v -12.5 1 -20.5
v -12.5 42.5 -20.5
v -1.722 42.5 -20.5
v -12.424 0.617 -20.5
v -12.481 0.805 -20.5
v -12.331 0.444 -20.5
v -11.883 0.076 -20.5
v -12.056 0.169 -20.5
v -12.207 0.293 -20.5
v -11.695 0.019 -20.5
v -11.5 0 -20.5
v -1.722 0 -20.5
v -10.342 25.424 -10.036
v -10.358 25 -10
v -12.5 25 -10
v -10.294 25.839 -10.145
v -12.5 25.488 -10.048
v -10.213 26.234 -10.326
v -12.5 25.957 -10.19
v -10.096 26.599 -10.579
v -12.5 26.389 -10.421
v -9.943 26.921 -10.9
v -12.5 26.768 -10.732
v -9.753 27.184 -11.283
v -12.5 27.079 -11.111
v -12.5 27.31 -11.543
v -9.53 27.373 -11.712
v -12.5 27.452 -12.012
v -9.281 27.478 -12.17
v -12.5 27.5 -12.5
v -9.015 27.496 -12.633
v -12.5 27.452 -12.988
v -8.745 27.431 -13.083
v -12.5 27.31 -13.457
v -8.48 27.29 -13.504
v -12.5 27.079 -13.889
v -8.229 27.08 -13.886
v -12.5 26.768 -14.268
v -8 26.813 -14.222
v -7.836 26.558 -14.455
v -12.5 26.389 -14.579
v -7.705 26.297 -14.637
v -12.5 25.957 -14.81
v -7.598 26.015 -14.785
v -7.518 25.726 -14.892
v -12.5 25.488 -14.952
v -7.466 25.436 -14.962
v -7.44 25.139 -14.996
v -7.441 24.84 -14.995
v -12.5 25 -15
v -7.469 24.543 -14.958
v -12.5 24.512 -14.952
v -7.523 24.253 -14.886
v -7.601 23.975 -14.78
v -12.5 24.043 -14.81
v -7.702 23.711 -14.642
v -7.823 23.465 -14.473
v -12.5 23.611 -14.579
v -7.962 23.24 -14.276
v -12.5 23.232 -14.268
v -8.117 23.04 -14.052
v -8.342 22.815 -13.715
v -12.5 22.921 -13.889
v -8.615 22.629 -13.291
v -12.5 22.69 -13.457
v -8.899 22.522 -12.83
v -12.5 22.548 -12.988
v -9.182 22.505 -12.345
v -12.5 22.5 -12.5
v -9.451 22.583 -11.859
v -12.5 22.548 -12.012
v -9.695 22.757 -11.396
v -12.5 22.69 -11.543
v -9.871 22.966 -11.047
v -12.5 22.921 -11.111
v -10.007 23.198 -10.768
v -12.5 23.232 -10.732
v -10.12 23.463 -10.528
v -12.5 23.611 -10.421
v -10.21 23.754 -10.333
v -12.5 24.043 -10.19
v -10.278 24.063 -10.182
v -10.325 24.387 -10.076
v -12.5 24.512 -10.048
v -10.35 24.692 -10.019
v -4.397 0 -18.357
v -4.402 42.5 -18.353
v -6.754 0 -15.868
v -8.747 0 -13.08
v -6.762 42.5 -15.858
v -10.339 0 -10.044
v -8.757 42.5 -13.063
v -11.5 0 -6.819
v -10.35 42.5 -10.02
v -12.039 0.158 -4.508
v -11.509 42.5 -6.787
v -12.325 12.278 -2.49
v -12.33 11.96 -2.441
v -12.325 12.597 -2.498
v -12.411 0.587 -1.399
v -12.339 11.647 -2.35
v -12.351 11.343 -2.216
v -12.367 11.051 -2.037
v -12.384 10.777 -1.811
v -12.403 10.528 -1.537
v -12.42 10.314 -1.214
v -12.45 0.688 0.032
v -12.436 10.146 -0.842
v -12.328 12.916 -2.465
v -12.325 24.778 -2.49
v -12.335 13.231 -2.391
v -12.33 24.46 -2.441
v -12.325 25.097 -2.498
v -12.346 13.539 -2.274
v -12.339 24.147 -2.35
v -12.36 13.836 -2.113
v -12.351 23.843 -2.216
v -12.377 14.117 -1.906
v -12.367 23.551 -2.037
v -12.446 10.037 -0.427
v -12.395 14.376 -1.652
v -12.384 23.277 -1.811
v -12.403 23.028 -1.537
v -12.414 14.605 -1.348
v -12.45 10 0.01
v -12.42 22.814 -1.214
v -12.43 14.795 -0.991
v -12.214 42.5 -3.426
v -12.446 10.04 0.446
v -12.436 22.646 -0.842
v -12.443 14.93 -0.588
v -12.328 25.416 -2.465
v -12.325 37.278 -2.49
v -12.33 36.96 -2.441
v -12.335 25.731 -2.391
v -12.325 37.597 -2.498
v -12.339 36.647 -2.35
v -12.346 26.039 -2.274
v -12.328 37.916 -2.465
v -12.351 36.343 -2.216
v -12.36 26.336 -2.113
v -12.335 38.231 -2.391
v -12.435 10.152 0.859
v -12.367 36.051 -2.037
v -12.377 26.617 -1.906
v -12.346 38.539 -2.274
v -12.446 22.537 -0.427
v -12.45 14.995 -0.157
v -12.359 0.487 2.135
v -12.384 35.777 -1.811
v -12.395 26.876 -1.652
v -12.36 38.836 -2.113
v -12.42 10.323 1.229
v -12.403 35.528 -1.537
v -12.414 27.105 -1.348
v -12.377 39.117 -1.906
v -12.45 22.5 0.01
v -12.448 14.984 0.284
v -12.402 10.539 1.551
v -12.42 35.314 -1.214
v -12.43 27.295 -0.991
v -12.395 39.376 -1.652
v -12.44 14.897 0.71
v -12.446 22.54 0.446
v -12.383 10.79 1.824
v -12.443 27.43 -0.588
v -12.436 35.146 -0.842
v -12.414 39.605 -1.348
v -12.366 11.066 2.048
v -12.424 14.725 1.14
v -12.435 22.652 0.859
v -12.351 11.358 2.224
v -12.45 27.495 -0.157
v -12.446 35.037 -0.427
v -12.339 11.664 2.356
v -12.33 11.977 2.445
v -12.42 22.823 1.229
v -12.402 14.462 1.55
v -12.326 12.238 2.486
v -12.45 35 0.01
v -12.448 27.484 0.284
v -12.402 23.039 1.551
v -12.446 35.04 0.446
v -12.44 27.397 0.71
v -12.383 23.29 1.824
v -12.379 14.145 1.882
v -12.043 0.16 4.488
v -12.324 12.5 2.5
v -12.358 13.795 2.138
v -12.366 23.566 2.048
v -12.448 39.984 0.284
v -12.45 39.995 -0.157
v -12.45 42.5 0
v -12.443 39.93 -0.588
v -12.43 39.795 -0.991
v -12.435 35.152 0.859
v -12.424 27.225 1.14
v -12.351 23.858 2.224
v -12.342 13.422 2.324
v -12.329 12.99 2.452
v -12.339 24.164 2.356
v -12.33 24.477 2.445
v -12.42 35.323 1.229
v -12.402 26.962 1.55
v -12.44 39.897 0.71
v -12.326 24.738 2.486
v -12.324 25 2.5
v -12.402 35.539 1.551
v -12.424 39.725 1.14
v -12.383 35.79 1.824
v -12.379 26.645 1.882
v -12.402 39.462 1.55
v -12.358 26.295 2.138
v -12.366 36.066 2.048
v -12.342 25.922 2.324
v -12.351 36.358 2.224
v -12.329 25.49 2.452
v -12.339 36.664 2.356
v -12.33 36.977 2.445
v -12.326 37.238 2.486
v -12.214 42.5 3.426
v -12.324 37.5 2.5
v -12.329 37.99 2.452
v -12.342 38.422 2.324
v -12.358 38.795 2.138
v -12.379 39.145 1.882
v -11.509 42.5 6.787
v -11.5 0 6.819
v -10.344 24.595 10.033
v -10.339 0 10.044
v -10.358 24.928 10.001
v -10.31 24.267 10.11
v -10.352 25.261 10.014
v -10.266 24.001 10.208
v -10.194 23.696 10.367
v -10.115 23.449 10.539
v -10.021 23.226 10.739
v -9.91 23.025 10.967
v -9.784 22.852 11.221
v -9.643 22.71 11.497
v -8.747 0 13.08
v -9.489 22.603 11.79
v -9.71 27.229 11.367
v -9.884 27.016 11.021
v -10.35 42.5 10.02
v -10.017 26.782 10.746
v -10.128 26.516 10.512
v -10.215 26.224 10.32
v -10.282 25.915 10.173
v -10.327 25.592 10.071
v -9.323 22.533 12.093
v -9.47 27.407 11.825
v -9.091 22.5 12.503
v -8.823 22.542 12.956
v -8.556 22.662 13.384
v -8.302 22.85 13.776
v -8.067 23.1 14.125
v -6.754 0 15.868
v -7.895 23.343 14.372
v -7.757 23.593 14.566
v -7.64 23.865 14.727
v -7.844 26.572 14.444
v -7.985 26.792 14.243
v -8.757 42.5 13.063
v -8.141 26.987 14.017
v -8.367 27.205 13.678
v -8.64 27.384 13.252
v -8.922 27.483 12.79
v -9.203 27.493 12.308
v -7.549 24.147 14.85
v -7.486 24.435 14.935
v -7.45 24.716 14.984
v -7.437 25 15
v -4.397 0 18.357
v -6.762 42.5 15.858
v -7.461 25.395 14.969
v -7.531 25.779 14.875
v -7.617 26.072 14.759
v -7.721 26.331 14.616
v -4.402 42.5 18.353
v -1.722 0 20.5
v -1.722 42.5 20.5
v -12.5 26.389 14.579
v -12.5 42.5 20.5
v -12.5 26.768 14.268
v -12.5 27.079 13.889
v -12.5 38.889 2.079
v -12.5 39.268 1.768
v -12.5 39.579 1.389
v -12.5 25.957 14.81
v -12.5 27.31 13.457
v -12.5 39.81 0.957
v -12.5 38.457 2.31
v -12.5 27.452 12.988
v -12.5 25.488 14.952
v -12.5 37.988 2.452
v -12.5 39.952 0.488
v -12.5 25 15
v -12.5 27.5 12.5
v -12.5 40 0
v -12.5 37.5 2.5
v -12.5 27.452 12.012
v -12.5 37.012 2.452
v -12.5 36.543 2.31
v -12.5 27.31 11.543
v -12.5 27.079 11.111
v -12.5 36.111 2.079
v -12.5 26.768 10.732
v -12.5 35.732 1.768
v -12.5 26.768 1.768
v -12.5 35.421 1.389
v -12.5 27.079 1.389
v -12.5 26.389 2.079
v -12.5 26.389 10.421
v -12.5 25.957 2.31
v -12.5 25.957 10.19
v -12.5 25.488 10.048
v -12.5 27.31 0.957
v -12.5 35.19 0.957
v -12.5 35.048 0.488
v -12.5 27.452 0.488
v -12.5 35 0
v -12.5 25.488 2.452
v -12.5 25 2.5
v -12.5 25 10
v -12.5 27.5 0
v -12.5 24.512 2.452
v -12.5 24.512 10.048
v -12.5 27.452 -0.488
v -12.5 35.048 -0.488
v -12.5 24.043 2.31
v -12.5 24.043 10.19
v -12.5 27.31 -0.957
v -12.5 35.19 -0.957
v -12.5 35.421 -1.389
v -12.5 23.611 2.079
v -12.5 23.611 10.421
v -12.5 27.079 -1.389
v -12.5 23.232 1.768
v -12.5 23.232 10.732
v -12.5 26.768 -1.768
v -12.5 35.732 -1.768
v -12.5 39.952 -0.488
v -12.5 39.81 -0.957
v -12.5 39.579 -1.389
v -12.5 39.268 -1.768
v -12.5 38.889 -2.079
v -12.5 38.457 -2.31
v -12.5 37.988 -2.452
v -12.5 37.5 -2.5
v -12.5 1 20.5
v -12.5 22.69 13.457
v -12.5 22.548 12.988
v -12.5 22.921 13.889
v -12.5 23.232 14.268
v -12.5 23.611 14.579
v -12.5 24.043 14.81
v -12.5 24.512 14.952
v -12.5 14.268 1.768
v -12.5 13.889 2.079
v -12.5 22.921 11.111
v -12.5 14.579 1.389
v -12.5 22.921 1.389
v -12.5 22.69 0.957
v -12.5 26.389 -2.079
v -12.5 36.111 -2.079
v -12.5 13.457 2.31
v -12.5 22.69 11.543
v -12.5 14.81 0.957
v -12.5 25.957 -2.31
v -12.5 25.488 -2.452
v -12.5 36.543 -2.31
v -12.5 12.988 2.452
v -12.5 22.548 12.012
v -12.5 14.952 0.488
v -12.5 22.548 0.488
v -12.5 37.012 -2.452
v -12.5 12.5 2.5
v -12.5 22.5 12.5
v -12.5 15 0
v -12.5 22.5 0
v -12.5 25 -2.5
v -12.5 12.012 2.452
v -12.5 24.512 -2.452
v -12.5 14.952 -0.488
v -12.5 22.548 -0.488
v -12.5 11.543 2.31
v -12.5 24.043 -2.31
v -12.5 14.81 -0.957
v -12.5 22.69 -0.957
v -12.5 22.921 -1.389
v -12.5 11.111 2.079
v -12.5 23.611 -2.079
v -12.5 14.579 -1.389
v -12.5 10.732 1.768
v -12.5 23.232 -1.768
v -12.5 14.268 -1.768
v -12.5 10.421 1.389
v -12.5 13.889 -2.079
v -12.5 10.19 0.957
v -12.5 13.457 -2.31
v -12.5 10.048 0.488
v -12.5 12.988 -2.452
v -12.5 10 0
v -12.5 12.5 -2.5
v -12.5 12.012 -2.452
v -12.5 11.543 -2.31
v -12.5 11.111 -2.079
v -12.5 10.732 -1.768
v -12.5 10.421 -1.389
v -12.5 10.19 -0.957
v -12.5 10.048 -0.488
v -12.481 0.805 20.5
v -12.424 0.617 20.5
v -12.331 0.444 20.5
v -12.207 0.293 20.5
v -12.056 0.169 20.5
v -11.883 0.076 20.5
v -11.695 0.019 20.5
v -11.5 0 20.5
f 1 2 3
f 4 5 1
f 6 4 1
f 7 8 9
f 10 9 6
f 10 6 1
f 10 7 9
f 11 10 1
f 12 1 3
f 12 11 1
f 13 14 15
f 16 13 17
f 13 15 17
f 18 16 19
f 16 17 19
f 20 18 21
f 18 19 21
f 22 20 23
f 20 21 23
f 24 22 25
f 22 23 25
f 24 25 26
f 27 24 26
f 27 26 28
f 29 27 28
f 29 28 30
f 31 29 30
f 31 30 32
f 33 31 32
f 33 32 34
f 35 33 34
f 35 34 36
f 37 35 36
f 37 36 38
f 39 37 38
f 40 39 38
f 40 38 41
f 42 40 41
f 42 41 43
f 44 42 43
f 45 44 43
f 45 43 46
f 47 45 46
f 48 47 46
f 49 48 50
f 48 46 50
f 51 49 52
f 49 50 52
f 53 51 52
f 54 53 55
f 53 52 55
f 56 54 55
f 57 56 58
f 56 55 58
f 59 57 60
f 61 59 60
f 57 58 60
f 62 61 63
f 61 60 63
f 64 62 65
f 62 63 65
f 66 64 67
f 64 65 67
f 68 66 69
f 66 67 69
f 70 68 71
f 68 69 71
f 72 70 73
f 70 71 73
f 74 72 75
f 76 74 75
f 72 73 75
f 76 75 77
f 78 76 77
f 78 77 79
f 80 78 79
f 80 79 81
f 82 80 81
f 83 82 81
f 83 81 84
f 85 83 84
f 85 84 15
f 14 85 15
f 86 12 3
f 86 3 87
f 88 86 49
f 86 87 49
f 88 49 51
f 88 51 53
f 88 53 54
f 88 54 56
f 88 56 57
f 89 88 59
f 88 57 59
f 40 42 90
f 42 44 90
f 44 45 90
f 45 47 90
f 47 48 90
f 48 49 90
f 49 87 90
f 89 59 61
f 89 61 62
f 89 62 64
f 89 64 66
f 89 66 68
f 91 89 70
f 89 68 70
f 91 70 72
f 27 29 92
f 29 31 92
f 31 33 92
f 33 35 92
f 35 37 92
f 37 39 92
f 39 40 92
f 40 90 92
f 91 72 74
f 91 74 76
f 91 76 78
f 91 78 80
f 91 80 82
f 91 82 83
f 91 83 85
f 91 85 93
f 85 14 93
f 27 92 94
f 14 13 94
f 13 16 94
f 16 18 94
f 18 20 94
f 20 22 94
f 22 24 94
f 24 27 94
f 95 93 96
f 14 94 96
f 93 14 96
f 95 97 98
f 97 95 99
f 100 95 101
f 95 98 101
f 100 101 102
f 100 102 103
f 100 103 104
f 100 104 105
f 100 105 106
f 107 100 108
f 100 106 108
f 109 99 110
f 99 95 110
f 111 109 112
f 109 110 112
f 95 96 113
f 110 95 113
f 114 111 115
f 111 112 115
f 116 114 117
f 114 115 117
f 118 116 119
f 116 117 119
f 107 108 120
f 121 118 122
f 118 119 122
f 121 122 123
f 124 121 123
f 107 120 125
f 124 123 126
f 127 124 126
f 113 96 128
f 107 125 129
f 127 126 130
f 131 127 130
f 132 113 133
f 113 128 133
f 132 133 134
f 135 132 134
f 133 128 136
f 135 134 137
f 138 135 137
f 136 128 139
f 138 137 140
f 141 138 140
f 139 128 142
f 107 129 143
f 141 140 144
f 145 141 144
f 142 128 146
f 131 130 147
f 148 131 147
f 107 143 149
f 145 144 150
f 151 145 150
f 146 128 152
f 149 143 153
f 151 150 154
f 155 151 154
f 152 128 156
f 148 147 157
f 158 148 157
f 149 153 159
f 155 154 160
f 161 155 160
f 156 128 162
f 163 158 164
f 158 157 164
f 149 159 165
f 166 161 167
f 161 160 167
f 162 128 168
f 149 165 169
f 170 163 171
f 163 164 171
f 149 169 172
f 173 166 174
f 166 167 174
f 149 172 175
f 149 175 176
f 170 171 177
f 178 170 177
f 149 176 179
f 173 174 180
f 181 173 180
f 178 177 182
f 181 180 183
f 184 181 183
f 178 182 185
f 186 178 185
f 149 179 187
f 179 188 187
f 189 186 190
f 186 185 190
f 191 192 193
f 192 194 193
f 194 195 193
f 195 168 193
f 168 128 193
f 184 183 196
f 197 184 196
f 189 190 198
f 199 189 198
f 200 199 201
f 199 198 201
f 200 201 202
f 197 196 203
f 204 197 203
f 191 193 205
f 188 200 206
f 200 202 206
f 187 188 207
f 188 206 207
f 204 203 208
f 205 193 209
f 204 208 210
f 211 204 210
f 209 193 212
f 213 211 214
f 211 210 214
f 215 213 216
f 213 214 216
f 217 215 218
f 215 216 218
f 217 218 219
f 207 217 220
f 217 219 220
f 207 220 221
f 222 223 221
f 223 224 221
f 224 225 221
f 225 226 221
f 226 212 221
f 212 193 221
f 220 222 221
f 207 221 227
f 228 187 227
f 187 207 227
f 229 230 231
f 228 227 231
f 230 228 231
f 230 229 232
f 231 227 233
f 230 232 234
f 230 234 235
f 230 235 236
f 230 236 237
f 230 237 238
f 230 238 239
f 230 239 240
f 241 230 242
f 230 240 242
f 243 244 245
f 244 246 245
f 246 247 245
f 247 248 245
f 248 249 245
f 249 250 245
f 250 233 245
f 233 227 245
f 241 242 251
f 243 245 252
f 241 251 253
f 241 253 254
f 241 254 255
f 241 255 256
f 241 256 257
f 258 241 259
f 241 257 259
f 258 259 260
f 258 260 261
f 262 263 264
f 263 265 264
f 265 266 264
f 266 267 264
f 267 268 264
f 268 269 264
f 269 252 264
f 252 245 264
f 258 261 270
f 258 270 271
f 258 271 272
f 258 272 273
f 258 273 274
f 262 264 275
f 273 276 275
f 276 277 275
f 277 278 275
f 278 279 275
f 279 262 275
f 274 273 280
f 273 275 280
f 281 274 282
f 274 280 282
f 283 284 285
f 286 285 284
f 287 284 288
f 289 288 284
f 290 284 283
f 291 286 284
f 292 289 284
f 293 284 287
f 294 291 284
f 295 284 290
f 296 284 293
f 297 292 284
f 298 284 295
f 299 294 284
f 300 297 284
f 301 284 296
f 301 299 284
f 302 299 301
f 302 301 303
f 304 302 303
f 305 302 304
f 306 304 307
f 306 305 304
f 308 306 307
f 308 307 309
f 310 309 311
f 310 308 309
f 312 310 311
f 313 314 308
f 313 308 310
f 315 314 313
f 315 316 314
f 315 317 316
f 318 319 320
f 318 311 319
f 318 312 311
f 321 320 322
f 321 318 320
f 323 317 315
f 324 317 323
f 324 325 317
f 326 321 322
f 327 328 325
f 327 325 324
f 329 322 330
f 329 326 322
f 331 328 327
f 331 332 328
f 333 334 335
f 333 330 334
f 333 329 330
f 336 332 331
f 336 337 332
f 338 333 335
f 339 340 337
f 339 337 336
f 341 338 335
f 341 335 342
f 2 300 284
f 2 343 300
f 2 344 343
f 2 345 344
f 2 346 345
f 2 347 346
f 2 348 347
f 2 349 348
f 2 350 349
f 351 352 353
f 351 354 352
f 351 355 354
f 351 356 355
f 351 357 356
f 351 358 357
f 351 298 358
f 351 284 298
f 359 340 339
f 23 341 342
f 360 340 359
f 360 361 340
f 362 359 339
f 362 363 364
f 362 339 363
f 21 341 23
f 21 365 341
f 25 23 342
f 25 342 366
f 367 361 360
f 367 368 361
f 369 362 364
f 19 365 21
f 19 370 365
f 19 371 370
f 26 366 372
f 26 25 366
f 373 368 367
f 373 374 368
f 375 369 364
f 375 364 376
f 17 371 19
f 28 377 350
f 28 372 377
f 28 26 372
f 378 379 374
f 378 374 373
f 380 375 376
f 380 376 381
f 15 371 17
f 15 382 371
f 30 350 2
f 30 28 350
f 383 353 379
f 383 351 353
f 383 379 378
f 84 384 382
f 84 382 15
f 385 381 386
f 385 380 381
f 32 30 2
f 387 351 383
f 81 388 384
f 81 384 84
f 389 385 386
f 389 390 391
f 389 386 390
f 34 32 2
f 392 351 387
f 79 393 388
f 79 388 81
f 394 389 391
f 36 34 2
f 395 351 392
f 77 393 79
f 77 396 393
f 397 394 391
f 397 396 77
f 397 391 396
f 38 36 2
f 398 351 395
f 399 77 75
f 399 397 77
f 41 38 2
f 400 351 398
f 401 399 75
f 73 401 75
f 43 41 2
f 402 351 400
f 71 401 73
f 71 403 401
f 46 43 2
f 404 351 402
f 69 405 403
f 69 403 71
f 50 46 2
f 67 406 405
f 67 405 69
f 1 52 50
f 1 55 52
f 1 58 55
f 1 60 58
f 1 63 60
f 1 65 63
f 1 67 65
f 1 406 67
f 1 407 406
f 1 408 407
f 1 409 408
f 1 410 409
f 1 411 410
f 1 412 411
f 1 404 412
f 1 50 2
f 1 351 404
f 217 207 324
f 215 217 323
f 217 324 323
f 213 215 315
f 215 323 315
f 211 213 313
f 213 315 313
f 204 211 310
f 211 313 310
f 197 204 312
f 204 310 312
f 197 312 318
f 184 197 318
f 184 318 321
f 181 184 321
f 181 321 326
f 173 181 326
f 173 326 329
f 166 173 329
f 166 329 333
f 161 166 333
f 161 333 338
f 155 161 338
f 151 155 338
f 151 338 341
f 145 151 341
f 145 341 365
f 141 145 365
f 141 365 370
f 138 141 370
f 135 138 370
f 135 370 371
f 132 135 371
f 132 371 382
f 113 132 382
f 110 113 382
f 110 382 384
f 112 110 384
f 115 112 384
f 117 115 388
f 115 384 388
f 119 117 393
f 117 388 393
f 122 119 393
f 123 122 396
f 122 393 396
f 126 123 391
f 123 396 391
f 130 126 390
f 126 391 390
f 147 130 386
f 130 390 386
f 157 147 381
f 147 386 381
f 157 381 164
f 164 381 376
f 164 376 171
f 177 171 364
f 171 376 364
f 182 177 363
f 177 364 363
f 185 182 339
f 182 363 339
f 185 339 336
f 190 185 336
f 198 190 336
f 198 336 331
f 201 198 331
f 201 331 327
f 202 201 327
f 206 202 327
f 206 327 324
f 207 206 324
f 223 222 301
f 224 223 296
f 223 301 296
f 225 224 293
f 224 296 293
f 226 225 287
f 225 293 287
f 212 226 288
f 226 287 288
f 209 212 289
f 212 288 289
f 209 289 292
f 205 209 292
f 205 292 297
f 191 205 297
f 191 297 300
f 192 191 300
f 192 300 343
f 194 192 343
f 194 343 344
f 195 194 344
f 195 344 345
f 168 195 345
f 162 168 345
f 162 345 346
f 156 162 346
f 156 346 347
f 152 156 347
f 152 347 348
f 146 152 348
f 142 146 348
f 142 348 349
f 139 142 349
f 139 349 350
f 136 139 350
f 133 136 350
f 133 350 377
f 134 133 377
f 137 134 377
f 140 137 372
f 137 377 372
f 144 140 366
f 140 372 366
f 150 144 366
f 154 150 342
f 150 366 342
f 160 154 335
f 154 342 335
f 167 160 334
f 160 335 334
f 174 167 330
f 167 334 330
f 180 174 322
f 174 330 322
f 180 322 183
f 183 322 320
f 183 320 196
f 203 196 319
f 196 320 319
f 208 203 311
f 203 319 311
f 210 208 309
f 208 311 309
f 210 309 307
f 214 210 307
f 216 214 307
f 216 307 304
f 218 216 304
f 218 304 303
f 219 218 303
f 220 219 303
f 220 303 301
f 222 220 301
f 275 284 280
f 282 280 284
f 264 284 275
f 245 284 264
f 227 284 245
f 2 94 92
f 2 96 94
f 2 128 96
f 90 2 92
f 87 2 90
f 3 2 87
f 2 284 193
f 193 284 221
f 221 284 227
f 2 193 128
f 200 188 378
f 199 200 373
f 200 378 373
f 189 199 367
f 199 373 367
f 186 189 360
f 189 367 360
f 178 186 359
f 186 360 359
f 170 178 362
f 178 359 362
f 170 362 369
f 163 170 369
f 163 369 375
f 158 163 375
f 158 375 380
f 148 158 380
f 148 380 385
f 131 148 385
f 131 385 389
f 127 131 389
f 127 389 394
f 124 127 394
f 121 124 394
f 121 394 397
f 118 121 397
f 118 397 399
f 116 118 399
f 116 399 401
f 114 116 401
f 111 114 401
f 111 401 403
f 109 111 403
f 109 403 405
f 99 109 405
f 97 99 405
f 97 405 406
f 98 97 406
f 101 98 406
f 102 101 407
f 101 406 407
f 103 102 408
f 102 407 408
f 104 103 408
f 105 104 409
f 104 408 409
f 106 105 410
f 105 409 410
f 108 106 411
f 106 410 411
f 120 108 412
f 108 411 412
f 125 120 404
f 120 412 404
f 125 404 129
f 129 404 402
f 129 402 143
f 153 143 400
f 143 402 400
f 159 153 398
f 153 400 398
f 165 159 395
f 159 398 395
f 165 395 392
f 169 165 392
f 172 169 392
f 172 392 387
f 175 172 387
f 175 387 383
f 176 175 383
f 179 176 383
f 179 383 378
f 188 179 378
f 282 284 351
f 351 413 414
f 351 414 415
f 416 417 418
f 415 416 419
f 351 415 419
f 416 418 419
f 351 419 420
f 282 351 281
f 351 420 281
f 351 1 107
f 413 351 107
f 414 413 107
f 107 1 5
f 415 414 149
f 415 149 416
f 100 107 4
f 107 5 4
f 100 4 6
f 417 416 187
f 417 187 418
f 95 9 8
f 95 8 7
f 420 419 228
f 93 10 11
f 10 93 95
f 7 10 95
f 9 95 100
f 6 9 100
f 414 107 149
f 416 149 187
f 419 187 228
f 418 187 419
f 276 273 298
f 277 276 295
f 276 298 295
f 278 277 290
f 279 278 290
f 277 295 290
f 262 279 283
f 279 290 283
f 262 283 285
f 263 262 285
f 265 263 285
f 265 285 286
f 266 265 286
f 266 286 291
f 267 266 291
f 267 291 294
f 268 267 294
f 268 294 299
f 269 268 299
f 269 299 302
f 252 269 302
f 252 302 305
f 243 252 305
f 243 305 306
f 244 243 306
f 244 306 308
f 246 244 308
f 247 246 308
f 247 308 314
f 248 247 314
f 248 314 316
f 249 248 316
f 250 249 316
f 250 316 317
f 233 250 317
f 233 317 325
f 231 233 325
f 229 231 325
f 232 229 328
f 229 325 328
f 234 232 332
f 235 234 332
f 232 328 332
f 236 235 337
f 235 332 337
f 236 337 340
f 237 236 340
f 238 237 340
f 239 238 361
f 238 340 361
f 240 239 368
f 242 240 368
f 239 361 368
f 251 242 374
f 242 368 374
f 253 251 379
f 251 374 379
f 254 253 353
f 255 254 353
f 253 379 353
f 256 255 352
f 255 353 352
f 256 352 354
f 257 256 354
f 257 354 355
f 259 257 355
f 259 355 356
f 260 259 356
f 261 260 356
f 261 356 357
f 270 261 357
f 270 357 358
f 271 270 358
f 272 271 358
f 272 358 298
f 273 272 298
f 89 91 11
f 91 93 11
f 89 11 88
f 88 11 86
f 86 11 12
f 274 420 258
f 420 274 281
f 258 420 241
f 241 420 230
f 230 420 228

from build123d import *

# Parameters (mm, degrees)
SKETCH_1_W          = 25
SKETCH_1_H          = 41
EXTRUDE_1_DEPTH     = 42.5
FILLET_1_R          = 1
SKETCH_2_R          = 24.95
CUT_EXTRUDE_1_DEPTH = 42.5
SKETCH_3_R          = 2.5
CUT_EXTRUDE_2_DEPTH = 10


with BuildPart() as part:
    # Эскиз1 → Бобышка-Вытянуть1 (new body)
    with BuildSketch(Plane(origin=(0, 0, 0), x_dir=(1, 0, 0), z_dir=(0, 1, 0))):
        Rectangle(SKETCH_1_W, SKETCH_1_H)
    extrude(amount=EXTRUDE_1_DEPTH)

    # Скругление1
    fillet_1_edges = [part.edges().sort_by_distance(p)[0] for p in [
        (-12.5, 0, 0),
    ]]
    fillet(fillet_1_edges, radius=FILLET_1_R)

    # Эскиз2 → Вырез-Вытянуть1 (cut)
    with BuildSketch(Plane(origin=(0, 42.5, 0), x_dir=(1, 0, 0), z_dir=(0, 1, 0))):
        with Locations((12.5, 0)):
            Circle(SKETCH_2_R)
    extrude(amount=-CUT_EXTRUDE_1_DEPTH, mode=Mode.SUBTRACT)

    # Эскиз3 → Вырез-Вытянуть2 (cut)
    with BuildSketch(Plane.ZY.offset(12.5)):
        with Locations((-12.5, 25)):
            Circle(SKETCH_3_R)
        with Locations((0, 37.5)):
            Circle(SKETCH_3_R)
        with Locations((12.5, 25)):
            Circle(SKETCH_3_R)
        with Locations((0, 12.5)):
            Circle(SKETCH_3_R)
        with Locations((0, 25)):
            Circle(SKETCH_3_R)
    extrude(amount=-CUT_EXTRUDE_2_DEPTH, mode=Mode.SUBTRACT)


solid = part.part
